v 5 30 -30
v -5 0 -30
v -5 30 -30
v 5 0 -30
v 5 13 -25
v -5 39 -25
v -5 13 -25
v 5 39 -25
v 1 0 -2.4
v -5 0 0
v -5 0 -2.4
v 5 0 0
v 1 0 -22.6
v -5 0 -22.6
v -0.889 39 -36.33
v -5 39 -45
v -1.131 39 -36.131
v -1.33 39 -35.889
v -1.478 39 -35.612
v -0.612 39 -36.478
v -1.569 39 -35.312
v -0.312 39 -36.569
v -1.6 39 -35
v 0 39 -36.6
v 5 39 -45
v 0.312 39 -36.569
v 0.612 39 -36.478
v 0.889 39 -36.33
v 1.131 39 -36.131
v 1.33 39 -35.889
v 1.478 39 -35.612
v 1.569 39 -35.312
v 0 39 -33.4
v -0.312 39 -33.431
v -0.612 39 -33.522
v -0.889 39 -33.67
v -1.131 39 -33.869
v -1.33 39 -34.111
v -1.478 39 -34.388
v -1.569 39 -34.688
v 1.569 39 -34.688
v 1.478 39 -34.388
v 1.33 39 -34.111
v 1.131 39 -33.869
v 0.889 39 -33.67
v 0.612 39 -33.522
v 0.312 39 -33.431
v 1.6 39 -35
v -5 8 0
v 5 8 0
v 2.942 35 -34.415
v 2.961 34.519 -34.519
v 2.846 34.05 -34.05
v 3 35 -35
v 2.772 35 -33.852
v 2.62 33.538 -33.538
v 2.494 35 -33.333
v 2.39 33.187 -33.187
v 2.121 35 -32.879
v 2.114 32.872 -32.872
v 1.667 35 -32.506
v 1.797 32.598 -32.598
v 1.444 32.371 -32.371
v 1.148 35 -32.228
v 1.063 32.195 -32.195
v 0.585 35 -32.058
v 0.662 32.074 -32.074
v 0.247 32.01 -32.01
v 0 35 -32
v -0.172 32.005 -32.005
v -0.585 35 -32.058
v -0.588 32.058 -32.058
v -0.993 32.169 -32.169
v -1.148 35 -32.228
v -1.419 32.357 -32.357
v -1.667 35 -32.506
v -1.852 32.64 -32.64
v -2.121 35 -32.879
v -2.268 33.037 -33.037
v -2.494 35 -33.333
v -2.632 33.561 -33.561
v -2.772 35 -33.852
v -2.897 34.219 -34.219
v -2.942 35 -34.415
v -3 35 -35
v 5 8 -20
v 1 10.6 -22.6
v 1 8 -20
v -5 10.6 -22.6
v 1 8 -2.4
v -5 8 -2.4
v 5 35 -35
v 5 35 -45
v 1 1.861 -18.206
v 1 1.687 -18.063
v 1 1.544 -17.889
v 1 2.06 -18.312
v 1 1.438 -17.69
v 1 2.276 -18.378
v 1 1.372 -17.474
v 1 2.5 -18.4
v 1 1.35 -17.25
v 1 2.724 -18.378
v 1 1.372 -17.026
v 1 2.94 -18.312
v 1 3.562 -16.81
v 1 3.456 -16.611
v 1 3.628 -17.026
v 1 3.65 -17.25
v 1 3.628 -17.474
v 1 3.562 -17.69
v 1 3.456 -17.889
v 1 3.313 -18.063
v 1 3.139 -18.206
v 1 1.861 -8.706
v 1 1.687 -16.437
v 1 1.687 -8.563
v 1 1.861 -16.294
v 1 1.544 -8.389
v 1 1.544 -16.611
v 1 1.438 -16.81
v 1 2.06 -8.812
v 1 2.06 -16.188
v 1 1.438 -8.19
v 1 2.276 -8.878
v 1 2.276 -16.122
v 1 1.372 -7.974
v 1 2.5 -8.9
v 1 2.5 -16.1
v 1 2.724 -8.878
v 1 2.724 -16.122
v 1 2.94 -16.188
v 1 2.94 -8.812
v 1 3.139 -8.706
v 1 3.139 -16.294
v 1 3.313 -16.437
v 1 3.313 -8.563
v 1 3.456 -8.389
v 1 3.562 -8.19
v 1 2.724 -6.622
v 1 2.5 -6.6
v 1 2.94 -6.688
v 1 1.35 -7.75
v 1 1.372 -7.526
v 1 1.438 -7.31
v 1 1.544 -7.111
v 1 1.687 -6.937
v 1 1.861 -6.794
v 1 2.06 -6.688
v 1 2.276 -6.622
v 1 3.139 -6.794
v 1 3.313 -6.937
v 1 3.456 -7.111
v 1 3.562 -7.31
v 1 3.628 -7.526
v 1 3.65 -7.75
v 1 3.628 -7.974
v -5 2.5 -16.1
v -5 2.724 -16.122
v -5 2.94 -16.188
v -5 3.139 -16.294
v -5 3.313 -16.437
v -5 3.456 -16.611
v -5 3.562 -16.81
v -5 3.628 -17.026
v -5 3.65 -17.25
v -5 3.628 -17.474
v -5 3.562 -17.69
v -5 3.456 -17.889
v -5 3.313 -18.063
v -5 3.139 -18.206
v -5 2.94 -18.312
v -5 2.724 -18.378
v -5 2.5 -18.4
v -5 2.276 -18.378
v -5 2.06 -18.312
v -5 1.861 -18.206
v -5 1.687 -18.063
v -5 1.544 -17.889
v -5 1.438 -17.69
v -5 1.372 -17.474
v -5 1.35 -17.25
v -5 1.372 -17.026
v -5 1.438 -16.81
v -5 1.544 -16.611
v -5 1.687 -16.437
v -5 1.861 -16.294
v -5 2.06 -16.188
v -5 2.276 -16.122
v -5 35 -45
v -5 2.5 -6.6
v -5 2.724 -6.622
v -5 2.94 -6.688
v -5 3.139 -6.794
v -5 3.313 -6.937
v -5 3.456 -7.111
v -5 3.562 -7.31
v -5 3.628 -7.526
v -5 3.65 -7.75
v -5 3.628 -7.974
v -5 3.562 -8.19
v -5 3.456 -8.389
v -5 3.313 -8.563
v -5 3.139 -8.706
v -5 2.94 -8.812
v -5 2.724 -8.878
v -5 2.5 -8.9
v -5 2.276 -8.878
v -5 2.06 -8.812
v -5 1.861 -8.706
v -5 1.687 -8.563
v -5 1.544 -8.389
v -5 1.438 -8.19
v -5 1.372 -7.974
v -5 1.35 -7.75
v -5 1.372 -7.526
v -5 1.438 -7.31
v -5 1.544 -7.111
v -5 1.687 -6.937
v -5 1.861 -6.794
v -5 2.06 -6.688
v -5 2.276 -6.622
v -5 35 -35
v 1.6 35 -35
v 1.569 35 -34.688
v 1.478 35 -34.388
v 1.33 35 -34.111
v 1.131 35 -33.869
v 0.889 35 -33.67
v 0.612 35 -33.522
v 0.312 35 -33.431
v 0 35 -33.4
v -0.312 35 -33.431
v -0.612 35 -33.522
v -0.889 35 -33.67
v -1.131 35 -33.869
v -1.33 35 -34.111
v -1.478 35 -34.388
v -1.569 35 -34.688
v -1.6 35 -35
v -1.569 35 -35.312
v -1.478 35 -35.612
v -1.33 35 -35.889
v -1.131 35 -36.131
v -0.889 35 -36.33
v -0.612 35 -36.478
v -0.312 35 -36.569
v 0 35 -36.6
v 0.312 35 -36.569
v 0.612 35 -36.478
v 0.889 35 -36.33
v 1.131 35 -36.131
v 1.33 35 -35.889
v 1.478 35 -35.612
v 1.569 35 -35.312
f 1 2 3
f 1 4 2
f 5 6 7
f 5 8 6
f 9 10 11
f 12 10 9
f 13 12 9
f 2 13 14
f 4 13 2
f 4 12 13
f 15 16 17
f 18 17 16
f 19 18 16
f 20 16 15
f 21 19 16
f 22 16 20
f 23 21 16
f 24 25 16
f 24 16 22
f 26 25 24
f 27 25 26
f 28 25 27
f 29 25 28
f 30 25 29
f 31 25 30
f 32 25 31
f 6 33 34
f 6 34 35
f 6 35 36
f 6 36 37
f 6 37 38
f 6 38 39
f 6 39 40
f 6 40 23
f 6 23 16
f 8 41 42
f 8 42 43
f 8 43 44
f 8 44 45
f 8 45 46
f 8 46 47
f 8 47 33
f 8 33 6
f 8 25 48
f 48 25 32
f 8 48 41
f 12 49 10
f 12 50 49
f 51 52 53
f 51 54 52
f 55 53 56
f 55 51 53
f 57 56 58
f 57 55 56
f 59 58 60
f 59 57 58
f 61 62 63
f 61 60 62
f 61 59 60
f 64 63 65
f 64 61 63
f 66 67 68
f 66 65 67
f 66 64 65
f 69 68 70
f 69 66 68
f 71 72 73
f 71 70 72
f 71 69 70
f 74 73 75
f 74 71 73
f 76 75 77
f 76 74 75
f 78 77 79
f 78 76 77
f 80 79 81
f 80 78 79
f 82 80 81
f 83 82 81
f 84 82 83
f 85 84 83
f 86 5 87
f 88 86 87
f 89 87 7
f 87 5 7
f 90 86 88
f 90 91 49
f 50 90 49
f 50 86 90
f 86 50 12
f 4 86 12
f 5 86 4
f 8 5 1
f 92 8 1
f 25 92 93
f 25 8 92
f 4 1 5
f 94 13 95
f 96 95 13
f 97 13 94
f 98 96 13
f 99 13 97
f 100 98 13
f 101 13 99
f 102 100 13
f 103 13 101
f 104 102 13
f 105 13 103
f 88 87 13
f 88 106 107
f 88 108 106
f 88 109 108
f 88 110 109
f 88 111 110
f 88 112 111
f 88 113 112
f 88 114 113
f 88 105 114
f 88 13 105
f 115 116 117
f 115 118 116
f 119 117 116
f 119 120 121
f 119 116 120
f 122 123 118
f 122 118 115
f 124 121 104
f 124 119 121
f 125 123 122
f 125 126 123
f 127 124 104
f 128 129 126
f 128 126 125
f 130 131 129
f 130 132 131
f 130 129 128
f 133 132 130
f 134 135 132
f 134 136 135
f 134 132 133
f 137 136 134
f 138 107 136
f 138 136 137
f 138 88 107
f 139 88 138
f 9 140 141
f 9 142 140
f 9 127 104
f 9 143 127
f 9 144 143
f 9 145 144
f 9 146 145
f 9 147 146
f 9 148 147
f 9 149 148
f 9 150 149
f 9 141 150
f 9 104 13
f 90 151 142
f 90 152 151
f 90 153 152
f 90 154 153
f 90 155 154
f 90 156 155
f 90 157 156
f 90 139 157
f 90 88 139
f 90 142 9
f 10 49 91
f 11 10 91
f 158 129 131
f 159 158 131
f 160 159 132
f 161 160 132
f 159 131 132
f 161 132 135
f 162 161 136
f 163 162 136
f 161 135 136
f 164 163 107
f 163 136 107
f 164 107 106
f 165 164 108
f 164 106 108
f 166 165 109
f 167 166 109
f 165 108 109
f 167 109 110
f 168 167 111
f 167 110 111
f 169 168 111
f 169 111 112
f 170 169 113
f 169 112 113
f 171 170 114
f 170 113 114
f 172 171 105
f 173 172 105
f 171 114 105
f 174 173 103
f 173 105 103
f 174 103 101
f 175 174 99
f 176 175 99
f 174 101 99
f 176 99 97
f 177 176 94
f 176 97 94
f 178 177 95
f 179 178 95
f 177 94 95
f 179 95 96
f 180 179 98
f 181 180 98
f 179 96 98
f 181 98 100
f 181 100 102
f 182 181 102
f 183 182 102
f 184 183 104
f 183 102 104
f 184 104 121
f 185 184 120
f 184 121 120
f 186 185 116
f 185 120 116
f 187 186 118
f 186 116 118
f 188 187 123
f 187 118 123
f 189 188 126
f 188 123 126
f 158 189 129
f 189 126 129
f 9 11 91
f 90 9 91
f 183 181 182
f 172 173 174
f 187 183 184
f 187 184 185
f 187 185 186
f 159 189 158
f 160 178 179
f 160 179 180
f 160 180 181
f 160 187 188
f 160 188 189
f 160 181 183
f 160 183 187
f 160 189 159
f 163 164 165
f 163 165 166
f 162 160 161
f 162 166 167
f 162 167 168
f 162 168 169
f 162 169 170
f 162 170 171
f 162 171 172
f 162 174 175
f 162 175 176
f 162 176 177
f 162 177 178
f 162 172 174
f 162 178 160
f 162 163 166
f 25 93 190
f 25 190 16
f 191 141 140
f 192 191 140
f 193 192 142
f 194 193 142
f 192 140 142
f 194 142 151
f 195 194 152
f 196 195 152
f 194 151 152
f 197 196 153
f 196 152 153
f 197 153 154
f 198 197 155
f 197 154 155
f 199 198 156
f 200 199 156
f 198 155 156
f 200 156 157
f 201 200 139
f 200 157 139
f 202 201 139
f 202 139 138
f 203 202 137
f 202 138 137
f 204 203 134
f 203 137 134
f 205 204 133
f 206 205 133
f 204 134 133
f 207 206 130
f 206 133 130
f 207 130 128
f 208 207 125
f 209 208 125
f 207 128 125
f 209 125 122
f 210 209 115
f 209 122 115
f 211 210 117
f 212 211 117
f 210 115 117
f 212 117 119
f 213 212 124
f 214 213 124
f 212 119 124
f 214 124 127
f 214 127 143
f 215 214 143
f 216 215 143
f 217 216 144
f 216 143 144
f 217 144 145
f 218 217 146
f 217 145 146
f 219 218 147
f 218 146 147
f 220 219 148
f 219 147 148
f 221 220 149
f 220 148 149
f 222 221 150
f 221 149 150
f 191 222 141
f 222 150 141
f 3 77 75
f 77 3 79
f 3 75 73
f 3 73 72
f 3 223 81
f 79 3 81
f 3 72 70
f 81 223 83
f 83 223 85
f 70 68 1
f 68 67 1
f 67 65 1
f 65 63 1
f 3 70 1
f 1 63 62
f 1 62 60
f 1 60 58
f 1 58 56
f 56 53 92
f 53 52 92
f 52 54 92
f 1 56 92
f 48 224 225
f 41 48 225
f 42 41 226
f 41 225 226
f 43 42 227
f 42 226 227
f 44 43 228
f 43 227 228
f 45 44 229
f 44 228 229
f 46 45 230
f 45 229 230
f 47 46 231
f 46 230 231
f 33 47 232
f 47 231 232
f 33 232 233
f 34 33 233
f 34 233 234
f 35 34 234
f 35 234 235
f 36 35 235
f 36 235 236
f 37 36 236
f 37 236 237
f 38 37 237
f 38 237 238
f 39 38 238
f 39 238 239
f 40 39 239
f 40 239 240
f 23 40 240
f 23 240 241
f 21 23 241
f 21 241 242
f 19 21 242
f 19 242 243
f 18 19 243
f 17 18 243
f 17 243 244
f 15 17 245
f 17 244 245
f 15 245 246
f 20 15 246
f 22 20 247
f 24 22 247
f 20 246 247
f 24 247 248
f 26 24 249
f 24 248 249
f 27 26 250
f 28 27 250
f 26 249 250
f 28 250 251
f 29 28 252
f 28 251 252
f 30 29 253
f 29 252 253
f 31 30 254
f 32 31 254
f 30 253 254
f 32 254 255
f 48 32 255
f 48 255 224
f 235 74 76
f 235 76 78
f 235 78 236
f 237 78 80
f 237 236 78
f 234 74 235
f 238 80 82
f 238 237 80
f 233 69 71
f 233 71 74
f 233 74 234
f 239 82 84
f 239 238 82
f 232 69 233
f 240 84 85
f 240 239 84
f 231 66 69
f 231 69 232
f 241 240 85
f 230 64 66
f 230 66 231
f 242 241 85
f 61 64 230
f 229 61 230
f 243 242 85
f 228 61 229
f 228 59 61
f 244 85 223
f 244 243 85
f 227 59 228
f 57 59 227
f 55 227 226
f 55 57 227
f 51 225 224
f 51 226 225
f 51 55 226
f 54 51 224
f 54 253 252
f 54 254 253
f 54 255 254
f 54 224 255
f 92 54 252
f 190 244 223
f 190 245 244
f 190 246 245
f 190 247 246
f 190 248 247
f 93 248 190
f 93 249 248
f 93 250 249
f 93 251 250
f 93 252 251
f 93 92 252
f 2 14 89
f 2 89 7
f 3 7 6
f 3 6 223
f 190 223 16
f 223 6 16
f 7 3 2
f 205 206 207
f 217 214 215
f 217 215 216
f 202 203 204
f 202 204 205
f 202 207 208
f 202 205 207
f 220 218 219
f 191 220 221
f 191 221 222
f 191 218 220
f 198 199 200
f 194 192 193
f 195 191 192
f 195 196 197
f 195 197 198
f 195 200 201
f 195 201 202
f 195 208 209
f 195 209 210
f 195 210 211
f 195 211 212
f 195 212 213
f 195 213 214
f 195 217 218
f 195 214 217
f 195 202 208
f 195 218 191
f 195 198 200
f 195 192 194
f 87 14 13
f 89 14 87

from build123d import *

# Parameters (mm, degrees)
EXTRUDE_1_DEPTH     = 5
SKETCH_2_W          = 20.2
SKETCH_2_H          = 8
CUT_EXTRUDE_1_DEPTH = 6
SKETCH_3_R          = 1.15
EXTRUDE_2_DEPTH     = 6
CHAMFER_1_SIZE      = 5
SKETCH_4_R          = 3
CUT_EXTRUDE_2_DEPTH = 6
SKETCH_5_R          = 1.6
CUT_EXTRUDE_3_DEPTH = 5


with BuildPart() as part:
    # 草图1 → 凸台-拉伸1 (new body, symmetric)
    with BuildSketch(Plane(origin=(0, 0, 0), x_dir=(0, 0, -1), z_dir=(1, 0, 0))):
        Polygon((0, 0), (30, 0), (30, 35), (45, 35), (45, 39), (25, 39), (25, 8), (0, 8), align=None)
    extrude(amount=EXTRUDE_1_DEPTH, both=True)

    # 草图2 → 切除-拉伸1 (cut)
    with BuildSketch(Plane.ZY.offset(5)):
        with Locations((-12.5, 4)):
            Rectangle(SKETCH_2_W, SKETCH_2_H)
    extrude(amount=-CUT_EXTRUDE_1_DEPTH, mode=Mode.SUBTRACT)

    # 草图3 → 凸台-拉伸2 (add)
    with BuildSketch(Plane.ZY.offset(-1)):
        with Locations((-17.25, 2.5)):
            Circle(SKETCH_3_R)
        with Locations((-7.75, 2.5)):
            Circle(SKETCH_3_R)
    extrude(amount=EXTRUDE_2_DEPTH)

    # 倒角1
    chamfer_1_edges = [part.edges().sort_by_distance(p)[0] for p in [
        (0, 8, -25),
        (0, 35, -30),
    ]]
    chamfer(chamfer_1_edges, length=CHAMFER_1_SIZE)

    # 草图4 → 切除-拉伸2 (cut)
    with BuildSketch(Plane.XZ.offset(-35)):
        with Locations((0, -35)):
            Circle(SKETCH_4_R)
    extrude(amount=CUT_EXTRUDE_2_DEPTH, mode=Mode.SUBTRACT)

    # 草图5 → 切除-拉伸3 (cut, through all)
    with BuildSketch(Plane.XZ.offset(-35)):
        with Locations((0, -35)):
            Circle(SKETCH_5_R)
    extrude(amount=-CUT_EXTRUDE_3_DEPTH, mode=Mode.SUBTRACT)


solid = part.part
